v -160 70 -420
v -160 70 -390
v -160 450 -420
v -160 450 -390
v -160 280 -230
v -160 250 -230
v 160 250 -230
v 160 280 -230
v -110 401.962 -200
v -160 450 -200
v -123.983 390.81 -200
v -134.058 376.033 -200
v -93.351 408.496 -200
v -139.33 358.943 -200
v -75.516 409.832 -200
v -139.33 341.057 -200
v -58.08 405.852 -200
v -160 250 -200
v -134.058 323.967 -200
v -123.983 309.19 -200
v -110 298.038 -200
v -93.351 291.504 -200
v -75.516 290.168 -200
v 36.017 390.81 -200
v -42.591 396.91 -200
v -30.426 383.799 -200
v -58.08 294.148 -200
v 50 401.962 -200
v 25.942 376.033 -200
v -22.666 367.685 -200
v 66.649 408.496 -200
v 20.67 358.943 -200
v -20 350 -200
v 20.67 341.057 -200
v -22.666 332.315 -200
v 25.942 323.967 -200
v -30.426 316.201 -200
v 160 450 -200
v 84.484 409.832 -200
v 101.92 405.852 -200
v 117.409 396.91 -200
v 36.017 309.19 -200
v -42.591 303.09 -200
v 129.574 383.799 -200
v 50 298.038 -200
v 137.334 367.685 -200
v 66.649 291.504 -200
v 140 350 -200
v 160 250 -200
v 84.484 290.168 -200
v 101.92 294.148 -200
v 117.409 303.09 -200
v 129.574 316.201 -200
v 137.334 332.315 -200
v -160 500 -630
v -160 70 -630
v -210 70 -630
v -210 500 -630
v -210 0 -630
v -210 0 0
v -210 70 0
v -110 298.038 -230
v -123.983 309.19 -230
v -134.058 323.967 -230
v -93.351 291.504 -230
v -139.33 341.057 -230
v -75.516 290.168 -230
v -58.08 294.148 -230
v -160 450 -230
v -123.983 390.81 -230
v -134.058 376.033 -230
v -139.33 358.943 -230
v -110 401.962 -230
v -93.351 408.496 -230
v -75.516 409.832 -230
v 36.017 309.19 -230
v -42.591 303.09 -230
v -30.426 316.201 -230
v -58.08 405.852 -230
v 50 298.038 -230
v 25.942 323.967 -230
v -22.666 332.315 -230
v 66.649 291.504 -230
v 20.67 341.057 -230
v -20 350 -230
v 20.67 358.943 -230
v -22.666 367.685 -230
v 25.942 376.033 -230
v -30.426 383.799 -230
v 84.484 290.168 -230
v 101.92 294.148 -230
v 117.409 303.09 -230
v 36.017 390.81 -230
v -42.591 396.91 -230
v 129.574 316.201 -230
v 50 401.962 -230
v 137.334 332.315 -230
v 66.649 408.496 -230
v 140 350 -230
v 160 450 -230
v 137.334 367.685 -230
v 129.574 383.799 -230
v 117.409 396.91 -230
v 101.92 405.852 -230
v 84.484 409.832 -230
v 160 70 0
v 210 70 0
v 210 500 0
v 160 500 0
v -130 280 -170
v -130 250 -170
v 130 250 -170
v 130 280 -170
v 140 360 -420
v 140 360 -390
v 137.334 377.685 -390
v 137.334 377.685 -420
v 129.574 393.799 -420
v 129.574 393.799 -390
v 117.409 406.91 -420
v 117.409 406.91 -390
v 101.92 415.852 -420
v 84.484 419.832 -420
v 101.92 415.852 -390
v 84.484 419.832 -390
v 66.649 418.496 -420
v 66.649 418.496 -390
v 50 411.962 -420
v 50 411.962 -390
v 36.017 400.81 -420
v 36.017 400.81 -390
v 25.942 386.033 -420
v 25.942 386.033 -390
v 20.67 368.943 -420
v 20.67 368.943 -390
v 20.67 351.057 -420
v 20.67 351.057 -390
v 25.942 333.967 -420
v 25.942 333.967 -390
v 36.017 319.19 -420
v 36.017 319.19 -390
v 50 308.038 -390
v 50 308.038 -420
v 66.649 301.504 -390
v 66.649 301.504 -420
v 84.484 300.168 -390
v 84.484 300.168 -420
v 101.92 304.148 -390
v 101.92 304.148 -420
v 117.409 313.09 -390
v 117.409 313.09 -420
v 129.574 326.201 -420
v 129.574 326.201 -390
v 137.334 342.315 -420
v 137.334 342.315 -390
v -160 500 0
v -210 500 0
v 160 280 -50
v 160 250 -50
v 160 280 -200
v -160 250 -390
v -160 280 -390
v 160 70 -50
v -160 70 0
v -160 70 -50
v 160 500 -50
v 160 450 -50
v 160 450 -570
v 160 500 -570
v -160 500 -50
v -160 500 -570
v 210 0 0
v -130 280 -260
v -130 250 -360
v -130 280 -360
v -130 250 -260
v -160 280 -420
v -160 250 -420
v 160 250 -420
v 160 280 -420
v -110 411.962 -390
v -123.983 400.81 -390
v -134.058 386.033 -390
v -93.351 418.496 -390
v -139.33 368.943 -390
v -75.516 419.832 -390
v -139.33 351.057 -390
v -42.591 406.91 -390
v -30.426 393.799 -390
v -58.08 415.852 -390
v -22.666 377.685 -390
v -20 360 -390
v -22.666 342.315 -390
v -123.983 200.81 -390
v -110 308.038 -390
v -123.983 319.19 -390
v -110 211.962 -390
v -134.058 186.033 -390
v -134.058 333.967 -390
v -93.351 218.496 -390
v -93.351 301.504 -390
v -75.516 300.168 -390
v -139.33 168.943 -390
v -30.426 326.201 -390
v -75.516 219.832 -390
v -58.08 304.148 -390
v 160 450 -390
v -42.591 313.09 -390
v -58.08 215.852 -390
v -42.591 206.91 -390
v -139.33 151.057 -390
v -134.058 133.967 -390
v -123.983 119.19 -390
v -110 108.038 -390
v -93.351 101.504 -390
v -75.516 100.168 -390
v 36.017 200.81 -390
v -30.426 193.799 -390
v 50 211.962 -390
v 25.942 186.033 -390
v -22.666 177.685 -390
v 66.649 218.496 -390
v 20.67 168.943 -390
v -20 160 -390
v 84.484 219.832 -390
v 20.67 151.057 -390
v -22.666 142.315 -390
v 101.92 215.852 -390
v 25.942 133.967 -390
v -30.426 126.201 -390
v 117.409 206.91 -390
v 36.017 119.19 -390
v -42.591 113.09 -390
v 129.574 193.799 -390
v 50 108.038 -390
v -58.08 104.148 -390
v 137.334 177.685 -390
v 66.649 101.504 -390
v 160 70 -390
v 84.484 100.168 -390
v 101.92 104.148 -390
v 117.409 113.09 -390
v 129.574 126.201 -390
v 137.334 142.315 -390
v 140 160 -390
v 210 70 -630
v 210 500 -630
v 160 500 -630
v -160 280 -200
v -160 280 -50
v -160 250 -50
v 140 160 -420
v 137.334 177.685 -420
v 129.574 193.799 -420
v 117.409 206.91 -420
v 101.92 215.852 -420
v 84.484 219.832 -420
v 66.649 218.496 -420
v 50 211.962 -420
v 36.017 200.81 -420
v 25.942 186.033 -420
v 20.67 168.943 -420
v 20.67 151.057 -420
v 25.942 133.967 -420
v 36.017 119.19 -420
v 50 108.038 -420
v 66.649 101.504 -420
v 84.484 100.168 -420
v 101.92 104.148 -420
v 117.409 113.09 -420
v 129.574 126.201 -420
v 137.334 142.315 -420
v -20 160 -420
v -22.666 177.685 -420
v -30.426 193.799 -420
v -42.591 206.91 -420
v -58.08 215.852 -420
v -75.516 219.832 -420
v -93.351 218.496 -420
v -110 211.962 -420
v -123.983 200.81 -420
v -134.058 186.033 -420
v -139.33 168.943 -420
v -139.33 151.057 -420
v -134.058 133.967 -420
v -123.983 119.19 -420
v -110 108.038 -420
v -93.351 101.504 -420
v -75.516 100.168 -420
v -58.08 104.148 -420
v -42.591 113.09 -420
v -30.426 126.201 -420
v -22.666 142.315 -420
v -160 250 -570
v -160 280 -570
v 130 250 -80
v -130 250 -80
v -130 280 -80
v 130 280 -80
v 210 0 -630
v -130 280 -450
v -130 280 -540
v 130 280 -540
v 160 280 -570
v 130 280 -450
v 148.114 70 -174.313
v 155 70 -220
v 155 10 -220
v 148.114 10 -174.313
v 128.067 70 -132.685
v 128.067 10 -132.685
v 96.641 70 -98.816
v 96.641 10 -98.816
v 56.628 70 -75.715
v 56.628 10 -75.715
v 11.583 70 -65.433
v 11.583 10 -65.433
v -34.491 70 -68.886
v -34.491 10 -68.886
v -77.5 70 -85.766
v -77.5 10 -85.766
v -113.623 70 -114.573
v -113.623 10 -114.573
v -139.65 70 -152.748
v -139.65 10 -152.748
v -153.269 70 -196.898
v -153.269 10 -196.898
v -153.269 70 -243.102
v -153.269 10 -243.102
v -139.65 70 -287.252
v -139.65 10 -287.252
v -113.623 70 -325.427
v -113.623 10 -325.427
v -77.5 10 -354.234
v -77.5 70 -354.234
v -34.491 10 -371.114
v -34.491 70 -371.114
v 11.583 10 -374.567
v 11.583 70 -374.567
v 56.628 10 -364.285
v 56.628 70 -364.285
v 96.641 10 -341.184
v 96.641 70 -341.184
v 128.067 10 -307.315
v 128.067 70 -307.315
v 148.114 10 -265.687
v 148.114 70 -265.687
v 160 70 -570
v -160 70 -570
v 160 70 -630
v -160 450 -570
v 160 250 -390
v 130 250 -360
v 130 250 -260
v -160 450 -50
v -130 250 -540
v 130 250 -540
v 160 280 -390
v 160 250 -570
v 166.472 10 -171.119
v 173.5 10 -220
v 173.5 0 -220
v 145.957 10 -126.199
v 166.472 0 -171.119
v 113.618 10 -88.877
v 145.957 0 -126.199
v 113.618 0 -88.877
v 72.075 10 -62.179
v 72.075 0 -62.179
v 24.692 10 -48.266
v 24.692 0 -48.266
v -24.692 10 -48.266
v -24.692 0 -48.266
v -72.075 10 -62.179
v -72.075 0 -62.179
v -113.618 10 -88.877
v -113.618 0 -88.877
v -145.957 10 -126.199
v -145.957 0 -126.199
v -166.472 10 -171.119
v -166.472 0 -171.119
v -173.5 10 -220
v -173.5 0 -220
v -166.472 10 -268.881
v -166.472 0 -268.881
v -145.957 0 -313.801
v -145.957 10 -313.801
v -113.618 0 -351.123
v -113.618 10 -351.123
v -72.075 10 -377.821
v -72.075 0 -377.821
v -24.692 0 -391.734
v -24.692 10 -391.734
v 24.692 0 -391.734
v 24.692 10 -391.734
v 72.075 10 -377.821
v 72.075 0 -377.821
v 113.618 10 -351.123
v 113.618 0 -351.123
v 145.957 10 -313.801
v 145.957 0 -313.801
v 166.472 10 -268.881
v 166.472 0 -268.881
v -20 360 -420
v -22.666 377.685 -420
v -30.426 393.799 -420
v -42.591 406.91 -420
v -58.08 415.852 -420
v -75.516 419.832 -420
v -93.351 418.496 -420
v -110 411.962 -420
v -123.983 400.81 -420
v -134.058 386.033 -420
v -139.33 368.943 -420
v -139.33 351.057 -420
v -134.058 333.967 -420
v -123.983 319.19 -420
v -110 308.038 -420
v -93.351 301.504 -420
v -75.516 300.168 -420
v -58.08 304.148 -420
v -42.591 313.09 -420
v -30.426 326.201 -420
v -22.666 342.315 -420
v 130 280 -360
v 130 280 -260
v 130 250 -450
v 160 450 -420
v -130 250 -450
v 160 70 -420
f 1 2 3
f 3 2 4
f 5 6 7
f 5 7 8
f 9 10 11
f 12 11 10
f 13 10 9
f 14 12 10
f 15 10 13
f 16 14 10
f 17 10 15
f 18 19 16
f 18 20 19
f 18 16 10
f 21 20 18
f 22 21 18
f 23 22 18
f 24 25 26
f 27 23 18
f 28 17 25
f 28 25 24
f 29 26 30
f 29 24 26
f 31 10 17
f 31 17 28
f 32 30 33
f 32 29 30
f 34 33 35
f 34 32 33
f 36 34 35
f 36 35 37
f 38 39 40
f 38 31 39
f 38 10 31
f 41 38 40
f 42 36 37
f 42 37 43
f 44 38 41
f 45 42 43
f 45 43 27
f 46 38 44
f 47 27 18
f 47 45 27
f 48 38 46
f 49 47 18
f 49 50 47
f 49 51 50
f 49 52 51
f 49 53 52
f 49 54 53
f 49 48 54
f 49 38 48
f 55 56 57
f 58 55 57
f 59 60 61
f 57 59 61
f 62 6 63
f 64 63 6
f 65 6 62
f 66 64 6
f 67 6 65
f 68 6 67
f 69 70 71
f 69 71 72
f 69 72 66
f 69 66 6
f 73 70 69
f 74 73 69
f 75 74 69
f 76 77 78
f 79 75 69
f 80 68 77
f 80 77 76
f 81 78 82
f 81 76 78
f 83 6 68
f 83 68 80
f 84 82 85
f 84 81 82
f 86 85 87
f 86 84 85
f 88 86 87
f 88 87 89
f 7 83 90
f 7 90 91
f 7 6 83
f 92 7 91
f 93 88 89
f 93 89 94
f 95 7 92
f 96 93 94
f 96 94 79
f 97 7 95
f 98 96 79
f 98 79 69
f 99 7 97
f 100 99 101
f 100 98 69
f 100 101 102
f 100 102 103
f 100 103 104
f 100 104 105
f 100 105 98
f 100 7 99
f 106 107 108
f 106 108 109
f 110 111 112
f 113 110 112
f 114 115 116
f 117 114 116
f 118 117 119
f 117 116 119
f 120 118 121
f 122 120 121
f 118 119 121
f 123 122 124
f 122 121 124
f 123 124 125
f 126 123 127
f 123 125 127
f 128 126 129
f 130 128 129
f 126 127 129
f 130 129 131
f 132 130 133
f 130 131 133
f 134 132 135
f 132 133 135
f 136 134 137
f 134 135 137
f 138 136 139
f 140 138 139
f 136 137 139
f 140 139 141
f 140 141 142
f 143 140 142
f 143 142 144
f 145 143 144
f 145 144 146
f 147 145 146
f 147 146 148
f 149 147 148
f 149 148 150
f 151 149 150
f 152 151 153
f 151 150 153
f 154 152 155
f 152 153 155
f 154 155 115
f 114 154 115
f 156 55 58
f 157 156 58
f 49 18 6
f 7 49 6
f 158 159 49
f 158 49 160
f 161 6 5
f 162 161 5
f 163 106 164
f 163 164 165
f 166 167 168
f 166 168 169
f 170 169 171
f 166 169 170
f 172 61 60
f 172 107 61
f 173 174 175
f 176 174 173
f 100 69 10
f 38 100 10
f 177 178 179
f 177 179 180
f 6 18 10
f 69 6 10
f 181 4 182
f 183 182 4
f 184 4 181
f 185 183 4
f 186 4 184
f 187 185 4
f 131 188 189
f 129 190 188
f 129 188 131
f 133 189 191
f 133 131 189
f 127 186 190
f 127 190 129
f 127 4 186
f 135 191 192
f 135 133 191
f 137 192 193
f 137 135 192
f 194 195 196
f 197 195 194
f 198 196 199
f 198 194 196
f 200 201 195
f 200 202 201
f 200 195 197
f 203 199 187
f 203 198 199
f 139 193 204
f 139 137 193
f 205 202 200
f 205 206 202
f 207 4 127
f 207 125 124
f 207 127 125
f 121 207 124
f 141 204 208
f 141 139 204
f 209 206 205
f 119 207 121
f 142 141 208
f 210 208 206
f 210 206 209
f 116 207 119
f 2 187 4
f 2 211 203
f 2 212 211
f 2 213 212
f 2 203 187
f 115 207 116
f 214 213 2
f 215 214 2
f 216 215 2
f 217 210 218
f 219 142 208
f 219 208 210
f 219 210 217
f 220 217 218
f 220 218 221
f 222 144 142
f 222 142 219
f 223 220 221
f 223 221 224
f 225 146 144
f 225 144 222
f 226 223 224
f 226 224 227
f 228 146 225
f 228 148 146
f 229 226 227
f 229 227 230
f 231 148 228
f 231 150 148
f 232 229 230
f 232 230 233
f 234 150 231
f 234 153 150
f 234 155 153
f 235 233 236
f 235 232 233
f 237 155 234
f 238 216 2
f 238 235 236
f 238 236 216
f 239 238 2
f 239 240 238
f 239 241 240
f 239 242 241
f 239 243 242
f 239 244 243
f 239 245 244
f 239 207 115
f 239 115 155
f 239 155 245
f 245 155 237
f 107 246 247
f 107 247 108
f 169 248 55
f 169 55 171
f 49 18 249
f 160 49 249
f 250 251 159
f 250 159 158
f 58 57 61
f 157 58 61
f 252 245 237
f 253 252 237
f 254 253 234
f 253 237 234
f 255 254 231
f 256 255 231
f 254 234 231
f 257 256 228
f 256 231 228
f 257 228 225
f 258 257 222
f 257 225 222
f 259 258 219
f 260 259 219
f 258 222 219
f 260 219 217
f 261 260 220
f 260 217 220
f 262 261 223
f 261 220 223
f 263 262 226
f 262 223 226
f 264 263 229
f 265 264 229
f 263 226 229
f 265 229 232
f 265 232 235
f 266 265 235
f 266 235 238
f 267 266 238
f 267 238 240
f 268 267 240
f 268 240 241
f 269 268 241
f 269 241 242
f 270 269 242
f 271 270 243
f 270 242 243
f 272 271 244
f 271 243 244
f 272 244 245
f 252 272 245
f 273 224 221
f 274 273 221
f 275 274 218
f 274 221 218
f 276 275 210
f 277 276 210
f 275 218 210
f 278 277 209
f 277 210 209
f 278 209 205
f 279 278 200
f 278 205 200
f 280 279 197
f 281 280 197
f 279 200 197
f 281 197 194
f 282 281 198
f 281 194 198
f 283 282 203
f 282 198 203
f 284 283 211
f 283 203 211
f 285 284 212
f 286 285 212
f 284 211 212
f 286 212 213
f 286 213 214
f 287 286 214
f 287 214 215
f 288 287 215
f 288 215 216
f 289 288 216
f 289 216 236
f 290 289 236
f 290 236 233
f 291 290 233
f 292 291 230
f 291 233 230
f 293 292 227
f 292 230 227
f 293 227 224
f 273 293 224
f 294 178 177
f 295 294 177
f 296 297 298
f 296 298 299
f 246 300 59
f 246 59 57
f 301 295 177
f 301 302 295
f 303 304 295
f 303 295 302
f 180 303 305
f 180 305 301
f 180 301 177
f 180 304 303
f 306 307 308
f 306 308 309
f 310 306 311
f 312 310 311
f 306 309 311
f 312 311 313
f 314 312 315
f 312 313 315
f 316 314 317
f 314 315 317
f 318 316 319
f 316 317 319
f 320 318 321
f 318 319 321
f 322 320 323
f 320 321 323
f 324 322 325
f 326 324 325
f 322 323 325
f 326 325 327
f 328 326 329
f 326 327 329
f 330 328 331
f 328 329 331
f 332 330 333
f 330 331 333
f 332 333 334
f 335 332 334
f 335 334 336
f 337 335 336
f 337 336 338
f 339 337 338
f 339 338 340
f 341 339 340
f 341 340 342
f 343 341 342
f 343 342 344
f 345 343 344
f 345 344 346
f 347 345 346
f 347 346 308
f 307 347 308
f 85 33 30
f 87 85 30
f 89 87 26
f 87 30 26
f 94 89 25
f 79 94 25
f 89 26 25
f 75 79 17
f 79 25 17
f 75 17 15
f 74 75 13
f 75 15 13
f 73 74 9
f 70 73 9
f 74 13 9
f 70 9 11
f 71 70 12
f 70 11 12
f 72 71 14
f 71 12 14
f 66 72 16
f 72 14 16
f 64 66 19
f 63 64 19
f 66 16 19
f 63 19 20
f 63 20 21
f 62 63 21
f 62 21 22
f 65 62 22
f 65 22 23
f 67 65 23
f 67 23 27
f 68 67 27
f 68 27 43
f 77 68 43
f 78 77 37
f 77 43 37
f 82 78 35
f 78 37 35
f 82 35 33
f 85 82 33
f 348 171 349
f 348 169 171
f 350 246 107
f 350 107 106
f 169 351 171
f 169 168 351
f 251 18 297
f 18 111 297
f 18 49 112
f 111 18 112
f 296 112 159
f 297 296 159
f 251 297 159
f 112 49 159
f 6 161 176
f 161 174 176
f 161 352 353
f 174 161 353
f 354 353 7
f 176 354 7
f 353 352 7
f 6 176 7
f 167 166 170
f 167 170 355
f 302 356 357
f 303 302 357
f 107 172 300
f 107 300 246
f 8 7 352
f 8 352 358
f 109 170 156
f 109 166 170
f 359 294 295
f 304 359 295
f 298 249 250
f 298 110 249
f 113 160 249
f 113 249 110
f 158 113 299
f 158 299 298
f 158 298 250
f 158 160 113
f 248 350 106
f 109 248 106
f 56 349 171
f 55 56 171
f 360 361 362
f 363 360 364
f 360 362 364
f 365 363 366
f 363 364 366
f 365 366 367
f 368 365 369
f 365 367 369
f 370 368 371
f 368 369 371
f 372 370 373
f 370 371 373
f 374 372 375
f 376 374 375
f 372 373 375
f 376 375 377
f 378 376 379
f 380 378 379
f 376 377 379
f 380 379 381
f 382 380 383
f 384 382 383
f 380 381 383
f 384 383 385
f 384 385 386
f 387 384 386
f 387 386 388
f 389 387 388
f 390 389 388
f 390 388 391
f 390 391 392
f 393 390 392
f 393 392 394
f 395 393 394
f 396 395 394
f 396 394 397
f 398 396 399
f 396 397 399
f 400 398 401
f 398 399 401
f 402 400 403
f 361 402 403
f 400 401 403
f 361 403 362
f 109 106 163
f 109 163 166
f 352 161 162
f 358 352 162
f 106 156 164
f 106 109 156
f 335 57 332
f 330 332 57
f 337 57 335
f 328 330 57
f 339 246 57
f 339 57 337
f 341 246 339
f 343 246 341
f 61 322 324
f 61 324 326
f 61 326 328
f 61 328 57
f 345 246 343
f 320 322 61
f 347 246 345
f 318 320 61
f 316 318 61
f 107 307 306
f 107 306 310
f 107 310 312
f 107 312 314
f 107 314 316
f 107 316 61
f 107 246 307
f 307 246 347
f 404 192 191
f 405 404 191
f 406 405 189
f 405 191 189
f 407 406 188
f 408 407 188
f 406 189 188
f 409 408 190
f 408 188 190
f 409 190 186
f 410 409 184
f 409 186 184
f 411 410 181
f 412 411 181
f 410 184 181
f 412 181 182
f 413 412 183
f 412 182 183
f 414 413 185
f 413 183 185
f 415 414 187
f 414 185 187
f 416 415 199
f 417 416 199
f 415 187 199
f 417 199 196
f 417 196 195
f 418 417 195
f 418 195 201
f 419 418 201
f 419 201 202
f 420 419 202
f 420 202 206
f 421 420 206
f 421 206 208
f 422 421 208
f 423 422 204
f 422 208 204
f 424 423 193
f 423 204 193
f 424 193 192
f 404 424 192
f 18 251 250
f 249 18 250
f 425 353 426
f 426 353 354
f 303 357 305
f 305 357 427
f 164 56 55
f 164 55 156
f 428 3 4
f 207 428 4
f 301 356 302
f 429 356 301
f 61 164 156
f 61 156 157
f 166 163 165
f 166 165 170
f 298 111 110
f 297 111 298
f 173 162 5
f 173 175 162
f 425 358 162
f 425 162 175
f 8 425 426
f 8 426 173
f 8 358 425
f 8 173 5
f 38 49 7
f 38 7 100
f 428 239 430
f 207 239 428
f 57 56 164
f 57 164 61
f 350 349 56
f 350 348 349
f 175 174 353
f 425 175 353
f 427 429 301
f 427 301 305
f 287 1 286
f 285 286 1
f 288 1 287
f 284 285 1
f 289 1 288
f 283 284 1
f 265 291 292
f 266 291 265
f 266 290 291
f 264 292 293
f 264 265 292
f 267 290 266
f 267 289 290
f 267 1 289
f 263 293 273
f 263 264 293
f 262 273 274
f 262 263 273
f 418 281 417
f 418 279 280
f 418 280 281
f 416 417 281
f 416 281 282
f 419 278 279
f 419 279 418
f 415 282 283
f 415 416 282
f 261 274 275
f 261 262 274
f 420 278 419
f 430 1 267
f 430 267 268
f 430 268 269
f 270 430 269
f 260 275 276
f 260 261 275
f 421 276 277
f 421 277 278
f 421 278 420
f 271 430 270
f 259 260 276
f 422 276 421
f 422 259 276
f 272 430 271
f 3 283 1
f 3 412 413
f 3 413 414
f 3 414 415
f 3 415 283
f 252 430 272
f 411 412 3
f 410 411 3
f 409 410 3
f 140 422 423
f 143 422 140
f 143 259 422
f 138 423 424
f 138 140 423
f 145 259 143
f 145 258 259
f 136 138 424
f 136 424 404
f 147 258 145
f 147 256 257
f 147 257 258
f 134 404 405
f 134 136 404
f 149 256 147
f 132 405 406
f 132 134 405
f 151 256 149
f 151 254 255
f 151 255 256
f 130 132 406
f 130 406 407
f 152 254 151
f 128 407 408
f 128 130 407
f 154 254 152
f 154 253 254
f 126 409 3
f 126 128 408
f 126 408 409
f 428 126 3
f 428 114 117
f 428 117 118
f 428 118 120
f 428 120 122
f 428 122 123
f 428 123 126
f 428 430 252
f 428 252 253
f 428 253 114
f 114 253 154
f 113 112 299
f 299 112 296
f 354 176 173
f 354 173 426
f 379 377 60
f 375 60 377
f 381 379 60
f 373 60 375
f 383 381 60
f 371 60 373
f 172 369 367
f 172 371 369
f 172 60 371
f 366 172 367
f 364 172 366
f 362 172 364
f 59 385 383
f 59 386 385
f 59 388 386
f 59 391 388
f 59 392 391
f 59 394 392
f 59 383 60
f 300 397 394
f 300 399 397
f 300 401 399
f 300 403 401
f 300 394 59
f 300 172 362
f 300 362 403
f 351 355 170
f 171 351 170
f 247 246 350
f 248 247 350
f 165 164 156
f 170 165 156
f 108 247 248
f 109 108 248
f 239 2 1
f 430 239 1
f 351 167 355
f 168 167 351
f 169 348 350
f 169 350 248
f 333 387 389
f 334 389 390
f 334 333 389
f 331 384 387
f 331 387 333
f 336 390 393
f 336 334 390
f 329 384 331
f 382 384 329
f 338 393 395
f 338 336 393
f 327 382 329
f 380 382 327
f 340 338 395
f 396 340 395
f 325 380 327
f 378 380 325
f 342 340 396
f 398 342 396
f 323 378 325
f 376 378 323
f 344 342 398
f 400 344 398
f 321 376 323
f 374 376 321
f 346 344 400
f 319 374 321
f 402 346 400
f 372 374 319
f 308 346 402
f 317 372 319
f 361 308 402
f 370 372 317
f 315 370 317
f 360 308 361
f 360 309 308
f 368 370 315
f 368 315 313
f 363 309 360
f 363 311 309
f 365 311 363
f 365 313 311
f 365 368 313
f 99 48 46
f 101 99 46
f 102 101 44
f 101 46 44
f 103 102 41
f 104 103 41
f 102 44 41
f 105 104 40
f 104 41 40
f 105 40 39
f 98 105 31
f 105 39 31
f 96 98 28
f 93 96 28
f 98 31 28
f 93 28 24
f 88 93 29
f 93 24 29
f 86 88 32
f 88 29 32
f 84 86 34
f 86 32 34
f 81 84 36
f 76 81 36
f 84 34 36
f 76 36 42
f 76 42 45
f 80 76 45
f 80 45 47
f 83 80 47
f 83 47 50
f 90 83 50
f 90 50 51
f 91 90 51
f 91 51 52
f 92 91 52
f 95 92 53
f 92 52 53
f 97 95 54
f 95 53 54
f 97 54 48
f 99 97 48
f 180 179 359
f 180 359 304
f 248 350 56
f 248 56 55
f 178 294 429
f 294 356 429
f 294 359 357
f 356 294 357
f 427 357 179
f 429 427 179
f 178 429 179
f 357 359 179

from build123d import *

# Parameters (mm, degrees)
F1_DEPTH  = 210
F2_DEPTH  = 160
F3_DEPTH  = 160
F4_DEPTH  = 160
F5_R      = 155
F6_DEPTH  = 70
F5_R_2    = 173.5
F7_DEPTH  = 10
F8_W      = 50
F8_H      = 630
F9_DEPTH  = 430
F10_DEPTH = 430
F0_W      = 30
F0_H      = 150
F11_DEPTH = 160
F12_DEPTH = 160
F0_H_2    = 160
F13_DEPTH = 160
F14_DEPTH = 160
F15_DEPTH = 160
F16_W     = 260
F16_H     = 90
F17_DEPTH = 30
F18_W     = 260
F18_H     = 100
F19_DEPTH = 30
F20_W     = 260
F20_H     = 90
F21_DEPTH = 30
F22_R     = 60
F23_DEPTH = 30
F24_R     = 60
F25_DEPTH = 30


with BuildPart() as f1:
    # F0 (on Right) → F1 (new body, symmetric)
    with BuildSketch(Plane.YZ):
        Polygon((70, 0), (0, 0), (0, -630), (70, -630), (70, -570), (70, -420), (70, -390), (70, -50), align=None)
    extrude(amount=F1_DEPTH, both=True)

    # F5 (on face) → F6 (cut, through all)
    with BuildSketch(Plane.XZ):
        with Locations((0, -220)):
            Circle(F5_R)
    extrude(amount=-F6_DEPTH, mode=Mode.SUBTRACT)

    # F5 (on face) → F7 (cut)
    with BuildSketch(Plane.XZ):
        with Locations((0, -220)):
            Circle(F5_R_2)
        with Locations((0, -220)):
            Circle(F5_R, mode=Mode.SUBTRACT)
    extrude(amount=-F7_DEPTH, mode=Mode.SUBTRACT)


with BuildPart() as f2:
    # F0 (on Right) → F2 (new body, symmetric)
    with BuildSketch(Plane.YZ):
        Polygon((70, -570), (70, -630), (500, -630), (500, -570), (450, -570), (280, -570), (250, -570), align=None)
    extrude(amount=F2_DEPTH, both=True)


with BuildPart() as f3:
    # F0 (on Right) → F3 (new body, symmetric)
    with BuildSketch(Plane.YZ):
        Polygon((500, 0), (70, 0), (70, -50), (250, -50), (280, -50), (450, -50), (500, -50), align=None)
    extrude(amount=F3_DEPTH, both=True)


with BuildPart() as f4:
    # F0 (on Right) → F4 (new body, symmetric)
    with BuildSketch(Plane.YZ):
        Polygon((500, -570), (500, -50), (450, -50), (450, -200), (450, -230), (450, -390), (450, -420), (450, -570), align=None)
    extrude(amount=F4_DEPTH, both=True)


with BuildPart() as f9:
    # F8 (on face) → F9 (new body, through all)
    with BuildSketch(Plane(origin=(0, 70, 0), x_dir=(-1, 0, 0), z_dir=(0, 1, 0))):
        with Locations((-185, -315)):
            Rectangle(F8_W, F8_H)
    extrude(amount=F9_DEPTH)


with BuildPart() as f10:
    # F8 (on face) → F10 (new body, through all)
    with BuildSketch(Plane(origin=(0, 70, 0), x_dir=(-1, 0, 0), z_dir=(0, 1, 0))):
        with Locations((185, -315)):
            Rectangle(F8_W, F8_H)
    extrude(amount=F10_DEPTH)


with BuildPart() as f11:
    # F0 (on Right) → F11 (new body, symmetric)
    with BuildSketch(Plane.YZ):
        with Locations((265, -125)):
            Rectangle(F0_W, F0_H)
    extrude(amount=F11_DEPTH, both=True)

    # F16 (on face) → F17 (cut, through all)
    with BuildSketch(Plane.XZ.offset(-250)):
        with Locations((0, -125)):
            Rectangle(F16_W, F16_H)
    extrude(amount=-F17_DEPTH, mode=Mode.SUBTRACT)


with BuildPart() as f12:
    # F0 (on Right) → F12 (new body, symmetric)
    with BuildSketch(Plane.YZ):
        Polygon((280, -200), (250, -200), (250, -230), (280, -230), (450, -230), (450, -200), align=None)
    extrude(amount=F12_DEPTH, both=True)

    # F22 (on face) → F23 (cut, through all)
    with BuildSketch(Plane.XY.offset(-200)):
        with Locations((-80, 350)):
            Circle(F22_R)
        with Locations((80, 350)):
            Circle(F22_R)
    extrude(amount=-F23_DEPTH, mode=Mode.SUBTRACT)


with BuildPart() as f13:
    # F0 (on Right) → F13 (new body, symmetric)
    with BuildSketch(Plane.YZ):
        with Locations((265, -310)):
            Rectangle(F0_W, F0_H_2)
    extrude(amount=F13_DEPTH, both=True)

    # F18 (on face) → F19 (cut, through all)
    with BuildSketch(Plane.XZ.offset(-250)):
        with Locations((0, -310)):
            Rectangle(F18_W, F18_H)
    extrude(amount=-F19_DEPTH, mode=Mode.SUBTRACT)


with BuildPart() as f14:
    # F0 (on Right) → F14 (new body, symmetric)
    with BuildSketch(Plane.YZ):
        Polygon((250, -390), (70, -390), (70, -420), (250, -420), (280, -420), (450, -420), (450, -390), (280, -390), align=None)
    extrude(amount=F14_DEPTH, both=True)

    # F24 (on face) → F25 (cut, through all)
    with BuildSketch(Plane.XY.offset(-390)):
        with Locations((-80, 360)):
            Circle(F24_R)
        with Locations((80, 360)):
            Circle(F24_R)
        with Locations((-80, 160)):
            Circle(F24_R)
        with Locations((80, 160)):
            Circle(F24_R)
    extrude(amount=-F25_DEPTH, mode=Mode.SUBTRACT)


with BuildPart() as f15:
    # F0 (on Right) → F15 (new body, symmetric)
    with BuildSketch(Plane.YZ):
        with Locations((265, -495)):
            Rectangle(F0_W, F0_H)
    extrude(amount=F15_DEPTH, both=True)

    # F20 (on face) → F21 (cut, through all)
    with BuildSketch(Plane.XZ.offset(-250)):
        with Locations((0, -495)):
            Rectangle(F20_W, F20_H)
    extrude(amount=-F21_DEPTH, mode=Mode.SUBTRACT)


solid = Compound([f1.part, f2.part, f3.part, f4.part, f9.part, f10.part, f11.part, f12.part, f13.part, f14.part, f15.part])
